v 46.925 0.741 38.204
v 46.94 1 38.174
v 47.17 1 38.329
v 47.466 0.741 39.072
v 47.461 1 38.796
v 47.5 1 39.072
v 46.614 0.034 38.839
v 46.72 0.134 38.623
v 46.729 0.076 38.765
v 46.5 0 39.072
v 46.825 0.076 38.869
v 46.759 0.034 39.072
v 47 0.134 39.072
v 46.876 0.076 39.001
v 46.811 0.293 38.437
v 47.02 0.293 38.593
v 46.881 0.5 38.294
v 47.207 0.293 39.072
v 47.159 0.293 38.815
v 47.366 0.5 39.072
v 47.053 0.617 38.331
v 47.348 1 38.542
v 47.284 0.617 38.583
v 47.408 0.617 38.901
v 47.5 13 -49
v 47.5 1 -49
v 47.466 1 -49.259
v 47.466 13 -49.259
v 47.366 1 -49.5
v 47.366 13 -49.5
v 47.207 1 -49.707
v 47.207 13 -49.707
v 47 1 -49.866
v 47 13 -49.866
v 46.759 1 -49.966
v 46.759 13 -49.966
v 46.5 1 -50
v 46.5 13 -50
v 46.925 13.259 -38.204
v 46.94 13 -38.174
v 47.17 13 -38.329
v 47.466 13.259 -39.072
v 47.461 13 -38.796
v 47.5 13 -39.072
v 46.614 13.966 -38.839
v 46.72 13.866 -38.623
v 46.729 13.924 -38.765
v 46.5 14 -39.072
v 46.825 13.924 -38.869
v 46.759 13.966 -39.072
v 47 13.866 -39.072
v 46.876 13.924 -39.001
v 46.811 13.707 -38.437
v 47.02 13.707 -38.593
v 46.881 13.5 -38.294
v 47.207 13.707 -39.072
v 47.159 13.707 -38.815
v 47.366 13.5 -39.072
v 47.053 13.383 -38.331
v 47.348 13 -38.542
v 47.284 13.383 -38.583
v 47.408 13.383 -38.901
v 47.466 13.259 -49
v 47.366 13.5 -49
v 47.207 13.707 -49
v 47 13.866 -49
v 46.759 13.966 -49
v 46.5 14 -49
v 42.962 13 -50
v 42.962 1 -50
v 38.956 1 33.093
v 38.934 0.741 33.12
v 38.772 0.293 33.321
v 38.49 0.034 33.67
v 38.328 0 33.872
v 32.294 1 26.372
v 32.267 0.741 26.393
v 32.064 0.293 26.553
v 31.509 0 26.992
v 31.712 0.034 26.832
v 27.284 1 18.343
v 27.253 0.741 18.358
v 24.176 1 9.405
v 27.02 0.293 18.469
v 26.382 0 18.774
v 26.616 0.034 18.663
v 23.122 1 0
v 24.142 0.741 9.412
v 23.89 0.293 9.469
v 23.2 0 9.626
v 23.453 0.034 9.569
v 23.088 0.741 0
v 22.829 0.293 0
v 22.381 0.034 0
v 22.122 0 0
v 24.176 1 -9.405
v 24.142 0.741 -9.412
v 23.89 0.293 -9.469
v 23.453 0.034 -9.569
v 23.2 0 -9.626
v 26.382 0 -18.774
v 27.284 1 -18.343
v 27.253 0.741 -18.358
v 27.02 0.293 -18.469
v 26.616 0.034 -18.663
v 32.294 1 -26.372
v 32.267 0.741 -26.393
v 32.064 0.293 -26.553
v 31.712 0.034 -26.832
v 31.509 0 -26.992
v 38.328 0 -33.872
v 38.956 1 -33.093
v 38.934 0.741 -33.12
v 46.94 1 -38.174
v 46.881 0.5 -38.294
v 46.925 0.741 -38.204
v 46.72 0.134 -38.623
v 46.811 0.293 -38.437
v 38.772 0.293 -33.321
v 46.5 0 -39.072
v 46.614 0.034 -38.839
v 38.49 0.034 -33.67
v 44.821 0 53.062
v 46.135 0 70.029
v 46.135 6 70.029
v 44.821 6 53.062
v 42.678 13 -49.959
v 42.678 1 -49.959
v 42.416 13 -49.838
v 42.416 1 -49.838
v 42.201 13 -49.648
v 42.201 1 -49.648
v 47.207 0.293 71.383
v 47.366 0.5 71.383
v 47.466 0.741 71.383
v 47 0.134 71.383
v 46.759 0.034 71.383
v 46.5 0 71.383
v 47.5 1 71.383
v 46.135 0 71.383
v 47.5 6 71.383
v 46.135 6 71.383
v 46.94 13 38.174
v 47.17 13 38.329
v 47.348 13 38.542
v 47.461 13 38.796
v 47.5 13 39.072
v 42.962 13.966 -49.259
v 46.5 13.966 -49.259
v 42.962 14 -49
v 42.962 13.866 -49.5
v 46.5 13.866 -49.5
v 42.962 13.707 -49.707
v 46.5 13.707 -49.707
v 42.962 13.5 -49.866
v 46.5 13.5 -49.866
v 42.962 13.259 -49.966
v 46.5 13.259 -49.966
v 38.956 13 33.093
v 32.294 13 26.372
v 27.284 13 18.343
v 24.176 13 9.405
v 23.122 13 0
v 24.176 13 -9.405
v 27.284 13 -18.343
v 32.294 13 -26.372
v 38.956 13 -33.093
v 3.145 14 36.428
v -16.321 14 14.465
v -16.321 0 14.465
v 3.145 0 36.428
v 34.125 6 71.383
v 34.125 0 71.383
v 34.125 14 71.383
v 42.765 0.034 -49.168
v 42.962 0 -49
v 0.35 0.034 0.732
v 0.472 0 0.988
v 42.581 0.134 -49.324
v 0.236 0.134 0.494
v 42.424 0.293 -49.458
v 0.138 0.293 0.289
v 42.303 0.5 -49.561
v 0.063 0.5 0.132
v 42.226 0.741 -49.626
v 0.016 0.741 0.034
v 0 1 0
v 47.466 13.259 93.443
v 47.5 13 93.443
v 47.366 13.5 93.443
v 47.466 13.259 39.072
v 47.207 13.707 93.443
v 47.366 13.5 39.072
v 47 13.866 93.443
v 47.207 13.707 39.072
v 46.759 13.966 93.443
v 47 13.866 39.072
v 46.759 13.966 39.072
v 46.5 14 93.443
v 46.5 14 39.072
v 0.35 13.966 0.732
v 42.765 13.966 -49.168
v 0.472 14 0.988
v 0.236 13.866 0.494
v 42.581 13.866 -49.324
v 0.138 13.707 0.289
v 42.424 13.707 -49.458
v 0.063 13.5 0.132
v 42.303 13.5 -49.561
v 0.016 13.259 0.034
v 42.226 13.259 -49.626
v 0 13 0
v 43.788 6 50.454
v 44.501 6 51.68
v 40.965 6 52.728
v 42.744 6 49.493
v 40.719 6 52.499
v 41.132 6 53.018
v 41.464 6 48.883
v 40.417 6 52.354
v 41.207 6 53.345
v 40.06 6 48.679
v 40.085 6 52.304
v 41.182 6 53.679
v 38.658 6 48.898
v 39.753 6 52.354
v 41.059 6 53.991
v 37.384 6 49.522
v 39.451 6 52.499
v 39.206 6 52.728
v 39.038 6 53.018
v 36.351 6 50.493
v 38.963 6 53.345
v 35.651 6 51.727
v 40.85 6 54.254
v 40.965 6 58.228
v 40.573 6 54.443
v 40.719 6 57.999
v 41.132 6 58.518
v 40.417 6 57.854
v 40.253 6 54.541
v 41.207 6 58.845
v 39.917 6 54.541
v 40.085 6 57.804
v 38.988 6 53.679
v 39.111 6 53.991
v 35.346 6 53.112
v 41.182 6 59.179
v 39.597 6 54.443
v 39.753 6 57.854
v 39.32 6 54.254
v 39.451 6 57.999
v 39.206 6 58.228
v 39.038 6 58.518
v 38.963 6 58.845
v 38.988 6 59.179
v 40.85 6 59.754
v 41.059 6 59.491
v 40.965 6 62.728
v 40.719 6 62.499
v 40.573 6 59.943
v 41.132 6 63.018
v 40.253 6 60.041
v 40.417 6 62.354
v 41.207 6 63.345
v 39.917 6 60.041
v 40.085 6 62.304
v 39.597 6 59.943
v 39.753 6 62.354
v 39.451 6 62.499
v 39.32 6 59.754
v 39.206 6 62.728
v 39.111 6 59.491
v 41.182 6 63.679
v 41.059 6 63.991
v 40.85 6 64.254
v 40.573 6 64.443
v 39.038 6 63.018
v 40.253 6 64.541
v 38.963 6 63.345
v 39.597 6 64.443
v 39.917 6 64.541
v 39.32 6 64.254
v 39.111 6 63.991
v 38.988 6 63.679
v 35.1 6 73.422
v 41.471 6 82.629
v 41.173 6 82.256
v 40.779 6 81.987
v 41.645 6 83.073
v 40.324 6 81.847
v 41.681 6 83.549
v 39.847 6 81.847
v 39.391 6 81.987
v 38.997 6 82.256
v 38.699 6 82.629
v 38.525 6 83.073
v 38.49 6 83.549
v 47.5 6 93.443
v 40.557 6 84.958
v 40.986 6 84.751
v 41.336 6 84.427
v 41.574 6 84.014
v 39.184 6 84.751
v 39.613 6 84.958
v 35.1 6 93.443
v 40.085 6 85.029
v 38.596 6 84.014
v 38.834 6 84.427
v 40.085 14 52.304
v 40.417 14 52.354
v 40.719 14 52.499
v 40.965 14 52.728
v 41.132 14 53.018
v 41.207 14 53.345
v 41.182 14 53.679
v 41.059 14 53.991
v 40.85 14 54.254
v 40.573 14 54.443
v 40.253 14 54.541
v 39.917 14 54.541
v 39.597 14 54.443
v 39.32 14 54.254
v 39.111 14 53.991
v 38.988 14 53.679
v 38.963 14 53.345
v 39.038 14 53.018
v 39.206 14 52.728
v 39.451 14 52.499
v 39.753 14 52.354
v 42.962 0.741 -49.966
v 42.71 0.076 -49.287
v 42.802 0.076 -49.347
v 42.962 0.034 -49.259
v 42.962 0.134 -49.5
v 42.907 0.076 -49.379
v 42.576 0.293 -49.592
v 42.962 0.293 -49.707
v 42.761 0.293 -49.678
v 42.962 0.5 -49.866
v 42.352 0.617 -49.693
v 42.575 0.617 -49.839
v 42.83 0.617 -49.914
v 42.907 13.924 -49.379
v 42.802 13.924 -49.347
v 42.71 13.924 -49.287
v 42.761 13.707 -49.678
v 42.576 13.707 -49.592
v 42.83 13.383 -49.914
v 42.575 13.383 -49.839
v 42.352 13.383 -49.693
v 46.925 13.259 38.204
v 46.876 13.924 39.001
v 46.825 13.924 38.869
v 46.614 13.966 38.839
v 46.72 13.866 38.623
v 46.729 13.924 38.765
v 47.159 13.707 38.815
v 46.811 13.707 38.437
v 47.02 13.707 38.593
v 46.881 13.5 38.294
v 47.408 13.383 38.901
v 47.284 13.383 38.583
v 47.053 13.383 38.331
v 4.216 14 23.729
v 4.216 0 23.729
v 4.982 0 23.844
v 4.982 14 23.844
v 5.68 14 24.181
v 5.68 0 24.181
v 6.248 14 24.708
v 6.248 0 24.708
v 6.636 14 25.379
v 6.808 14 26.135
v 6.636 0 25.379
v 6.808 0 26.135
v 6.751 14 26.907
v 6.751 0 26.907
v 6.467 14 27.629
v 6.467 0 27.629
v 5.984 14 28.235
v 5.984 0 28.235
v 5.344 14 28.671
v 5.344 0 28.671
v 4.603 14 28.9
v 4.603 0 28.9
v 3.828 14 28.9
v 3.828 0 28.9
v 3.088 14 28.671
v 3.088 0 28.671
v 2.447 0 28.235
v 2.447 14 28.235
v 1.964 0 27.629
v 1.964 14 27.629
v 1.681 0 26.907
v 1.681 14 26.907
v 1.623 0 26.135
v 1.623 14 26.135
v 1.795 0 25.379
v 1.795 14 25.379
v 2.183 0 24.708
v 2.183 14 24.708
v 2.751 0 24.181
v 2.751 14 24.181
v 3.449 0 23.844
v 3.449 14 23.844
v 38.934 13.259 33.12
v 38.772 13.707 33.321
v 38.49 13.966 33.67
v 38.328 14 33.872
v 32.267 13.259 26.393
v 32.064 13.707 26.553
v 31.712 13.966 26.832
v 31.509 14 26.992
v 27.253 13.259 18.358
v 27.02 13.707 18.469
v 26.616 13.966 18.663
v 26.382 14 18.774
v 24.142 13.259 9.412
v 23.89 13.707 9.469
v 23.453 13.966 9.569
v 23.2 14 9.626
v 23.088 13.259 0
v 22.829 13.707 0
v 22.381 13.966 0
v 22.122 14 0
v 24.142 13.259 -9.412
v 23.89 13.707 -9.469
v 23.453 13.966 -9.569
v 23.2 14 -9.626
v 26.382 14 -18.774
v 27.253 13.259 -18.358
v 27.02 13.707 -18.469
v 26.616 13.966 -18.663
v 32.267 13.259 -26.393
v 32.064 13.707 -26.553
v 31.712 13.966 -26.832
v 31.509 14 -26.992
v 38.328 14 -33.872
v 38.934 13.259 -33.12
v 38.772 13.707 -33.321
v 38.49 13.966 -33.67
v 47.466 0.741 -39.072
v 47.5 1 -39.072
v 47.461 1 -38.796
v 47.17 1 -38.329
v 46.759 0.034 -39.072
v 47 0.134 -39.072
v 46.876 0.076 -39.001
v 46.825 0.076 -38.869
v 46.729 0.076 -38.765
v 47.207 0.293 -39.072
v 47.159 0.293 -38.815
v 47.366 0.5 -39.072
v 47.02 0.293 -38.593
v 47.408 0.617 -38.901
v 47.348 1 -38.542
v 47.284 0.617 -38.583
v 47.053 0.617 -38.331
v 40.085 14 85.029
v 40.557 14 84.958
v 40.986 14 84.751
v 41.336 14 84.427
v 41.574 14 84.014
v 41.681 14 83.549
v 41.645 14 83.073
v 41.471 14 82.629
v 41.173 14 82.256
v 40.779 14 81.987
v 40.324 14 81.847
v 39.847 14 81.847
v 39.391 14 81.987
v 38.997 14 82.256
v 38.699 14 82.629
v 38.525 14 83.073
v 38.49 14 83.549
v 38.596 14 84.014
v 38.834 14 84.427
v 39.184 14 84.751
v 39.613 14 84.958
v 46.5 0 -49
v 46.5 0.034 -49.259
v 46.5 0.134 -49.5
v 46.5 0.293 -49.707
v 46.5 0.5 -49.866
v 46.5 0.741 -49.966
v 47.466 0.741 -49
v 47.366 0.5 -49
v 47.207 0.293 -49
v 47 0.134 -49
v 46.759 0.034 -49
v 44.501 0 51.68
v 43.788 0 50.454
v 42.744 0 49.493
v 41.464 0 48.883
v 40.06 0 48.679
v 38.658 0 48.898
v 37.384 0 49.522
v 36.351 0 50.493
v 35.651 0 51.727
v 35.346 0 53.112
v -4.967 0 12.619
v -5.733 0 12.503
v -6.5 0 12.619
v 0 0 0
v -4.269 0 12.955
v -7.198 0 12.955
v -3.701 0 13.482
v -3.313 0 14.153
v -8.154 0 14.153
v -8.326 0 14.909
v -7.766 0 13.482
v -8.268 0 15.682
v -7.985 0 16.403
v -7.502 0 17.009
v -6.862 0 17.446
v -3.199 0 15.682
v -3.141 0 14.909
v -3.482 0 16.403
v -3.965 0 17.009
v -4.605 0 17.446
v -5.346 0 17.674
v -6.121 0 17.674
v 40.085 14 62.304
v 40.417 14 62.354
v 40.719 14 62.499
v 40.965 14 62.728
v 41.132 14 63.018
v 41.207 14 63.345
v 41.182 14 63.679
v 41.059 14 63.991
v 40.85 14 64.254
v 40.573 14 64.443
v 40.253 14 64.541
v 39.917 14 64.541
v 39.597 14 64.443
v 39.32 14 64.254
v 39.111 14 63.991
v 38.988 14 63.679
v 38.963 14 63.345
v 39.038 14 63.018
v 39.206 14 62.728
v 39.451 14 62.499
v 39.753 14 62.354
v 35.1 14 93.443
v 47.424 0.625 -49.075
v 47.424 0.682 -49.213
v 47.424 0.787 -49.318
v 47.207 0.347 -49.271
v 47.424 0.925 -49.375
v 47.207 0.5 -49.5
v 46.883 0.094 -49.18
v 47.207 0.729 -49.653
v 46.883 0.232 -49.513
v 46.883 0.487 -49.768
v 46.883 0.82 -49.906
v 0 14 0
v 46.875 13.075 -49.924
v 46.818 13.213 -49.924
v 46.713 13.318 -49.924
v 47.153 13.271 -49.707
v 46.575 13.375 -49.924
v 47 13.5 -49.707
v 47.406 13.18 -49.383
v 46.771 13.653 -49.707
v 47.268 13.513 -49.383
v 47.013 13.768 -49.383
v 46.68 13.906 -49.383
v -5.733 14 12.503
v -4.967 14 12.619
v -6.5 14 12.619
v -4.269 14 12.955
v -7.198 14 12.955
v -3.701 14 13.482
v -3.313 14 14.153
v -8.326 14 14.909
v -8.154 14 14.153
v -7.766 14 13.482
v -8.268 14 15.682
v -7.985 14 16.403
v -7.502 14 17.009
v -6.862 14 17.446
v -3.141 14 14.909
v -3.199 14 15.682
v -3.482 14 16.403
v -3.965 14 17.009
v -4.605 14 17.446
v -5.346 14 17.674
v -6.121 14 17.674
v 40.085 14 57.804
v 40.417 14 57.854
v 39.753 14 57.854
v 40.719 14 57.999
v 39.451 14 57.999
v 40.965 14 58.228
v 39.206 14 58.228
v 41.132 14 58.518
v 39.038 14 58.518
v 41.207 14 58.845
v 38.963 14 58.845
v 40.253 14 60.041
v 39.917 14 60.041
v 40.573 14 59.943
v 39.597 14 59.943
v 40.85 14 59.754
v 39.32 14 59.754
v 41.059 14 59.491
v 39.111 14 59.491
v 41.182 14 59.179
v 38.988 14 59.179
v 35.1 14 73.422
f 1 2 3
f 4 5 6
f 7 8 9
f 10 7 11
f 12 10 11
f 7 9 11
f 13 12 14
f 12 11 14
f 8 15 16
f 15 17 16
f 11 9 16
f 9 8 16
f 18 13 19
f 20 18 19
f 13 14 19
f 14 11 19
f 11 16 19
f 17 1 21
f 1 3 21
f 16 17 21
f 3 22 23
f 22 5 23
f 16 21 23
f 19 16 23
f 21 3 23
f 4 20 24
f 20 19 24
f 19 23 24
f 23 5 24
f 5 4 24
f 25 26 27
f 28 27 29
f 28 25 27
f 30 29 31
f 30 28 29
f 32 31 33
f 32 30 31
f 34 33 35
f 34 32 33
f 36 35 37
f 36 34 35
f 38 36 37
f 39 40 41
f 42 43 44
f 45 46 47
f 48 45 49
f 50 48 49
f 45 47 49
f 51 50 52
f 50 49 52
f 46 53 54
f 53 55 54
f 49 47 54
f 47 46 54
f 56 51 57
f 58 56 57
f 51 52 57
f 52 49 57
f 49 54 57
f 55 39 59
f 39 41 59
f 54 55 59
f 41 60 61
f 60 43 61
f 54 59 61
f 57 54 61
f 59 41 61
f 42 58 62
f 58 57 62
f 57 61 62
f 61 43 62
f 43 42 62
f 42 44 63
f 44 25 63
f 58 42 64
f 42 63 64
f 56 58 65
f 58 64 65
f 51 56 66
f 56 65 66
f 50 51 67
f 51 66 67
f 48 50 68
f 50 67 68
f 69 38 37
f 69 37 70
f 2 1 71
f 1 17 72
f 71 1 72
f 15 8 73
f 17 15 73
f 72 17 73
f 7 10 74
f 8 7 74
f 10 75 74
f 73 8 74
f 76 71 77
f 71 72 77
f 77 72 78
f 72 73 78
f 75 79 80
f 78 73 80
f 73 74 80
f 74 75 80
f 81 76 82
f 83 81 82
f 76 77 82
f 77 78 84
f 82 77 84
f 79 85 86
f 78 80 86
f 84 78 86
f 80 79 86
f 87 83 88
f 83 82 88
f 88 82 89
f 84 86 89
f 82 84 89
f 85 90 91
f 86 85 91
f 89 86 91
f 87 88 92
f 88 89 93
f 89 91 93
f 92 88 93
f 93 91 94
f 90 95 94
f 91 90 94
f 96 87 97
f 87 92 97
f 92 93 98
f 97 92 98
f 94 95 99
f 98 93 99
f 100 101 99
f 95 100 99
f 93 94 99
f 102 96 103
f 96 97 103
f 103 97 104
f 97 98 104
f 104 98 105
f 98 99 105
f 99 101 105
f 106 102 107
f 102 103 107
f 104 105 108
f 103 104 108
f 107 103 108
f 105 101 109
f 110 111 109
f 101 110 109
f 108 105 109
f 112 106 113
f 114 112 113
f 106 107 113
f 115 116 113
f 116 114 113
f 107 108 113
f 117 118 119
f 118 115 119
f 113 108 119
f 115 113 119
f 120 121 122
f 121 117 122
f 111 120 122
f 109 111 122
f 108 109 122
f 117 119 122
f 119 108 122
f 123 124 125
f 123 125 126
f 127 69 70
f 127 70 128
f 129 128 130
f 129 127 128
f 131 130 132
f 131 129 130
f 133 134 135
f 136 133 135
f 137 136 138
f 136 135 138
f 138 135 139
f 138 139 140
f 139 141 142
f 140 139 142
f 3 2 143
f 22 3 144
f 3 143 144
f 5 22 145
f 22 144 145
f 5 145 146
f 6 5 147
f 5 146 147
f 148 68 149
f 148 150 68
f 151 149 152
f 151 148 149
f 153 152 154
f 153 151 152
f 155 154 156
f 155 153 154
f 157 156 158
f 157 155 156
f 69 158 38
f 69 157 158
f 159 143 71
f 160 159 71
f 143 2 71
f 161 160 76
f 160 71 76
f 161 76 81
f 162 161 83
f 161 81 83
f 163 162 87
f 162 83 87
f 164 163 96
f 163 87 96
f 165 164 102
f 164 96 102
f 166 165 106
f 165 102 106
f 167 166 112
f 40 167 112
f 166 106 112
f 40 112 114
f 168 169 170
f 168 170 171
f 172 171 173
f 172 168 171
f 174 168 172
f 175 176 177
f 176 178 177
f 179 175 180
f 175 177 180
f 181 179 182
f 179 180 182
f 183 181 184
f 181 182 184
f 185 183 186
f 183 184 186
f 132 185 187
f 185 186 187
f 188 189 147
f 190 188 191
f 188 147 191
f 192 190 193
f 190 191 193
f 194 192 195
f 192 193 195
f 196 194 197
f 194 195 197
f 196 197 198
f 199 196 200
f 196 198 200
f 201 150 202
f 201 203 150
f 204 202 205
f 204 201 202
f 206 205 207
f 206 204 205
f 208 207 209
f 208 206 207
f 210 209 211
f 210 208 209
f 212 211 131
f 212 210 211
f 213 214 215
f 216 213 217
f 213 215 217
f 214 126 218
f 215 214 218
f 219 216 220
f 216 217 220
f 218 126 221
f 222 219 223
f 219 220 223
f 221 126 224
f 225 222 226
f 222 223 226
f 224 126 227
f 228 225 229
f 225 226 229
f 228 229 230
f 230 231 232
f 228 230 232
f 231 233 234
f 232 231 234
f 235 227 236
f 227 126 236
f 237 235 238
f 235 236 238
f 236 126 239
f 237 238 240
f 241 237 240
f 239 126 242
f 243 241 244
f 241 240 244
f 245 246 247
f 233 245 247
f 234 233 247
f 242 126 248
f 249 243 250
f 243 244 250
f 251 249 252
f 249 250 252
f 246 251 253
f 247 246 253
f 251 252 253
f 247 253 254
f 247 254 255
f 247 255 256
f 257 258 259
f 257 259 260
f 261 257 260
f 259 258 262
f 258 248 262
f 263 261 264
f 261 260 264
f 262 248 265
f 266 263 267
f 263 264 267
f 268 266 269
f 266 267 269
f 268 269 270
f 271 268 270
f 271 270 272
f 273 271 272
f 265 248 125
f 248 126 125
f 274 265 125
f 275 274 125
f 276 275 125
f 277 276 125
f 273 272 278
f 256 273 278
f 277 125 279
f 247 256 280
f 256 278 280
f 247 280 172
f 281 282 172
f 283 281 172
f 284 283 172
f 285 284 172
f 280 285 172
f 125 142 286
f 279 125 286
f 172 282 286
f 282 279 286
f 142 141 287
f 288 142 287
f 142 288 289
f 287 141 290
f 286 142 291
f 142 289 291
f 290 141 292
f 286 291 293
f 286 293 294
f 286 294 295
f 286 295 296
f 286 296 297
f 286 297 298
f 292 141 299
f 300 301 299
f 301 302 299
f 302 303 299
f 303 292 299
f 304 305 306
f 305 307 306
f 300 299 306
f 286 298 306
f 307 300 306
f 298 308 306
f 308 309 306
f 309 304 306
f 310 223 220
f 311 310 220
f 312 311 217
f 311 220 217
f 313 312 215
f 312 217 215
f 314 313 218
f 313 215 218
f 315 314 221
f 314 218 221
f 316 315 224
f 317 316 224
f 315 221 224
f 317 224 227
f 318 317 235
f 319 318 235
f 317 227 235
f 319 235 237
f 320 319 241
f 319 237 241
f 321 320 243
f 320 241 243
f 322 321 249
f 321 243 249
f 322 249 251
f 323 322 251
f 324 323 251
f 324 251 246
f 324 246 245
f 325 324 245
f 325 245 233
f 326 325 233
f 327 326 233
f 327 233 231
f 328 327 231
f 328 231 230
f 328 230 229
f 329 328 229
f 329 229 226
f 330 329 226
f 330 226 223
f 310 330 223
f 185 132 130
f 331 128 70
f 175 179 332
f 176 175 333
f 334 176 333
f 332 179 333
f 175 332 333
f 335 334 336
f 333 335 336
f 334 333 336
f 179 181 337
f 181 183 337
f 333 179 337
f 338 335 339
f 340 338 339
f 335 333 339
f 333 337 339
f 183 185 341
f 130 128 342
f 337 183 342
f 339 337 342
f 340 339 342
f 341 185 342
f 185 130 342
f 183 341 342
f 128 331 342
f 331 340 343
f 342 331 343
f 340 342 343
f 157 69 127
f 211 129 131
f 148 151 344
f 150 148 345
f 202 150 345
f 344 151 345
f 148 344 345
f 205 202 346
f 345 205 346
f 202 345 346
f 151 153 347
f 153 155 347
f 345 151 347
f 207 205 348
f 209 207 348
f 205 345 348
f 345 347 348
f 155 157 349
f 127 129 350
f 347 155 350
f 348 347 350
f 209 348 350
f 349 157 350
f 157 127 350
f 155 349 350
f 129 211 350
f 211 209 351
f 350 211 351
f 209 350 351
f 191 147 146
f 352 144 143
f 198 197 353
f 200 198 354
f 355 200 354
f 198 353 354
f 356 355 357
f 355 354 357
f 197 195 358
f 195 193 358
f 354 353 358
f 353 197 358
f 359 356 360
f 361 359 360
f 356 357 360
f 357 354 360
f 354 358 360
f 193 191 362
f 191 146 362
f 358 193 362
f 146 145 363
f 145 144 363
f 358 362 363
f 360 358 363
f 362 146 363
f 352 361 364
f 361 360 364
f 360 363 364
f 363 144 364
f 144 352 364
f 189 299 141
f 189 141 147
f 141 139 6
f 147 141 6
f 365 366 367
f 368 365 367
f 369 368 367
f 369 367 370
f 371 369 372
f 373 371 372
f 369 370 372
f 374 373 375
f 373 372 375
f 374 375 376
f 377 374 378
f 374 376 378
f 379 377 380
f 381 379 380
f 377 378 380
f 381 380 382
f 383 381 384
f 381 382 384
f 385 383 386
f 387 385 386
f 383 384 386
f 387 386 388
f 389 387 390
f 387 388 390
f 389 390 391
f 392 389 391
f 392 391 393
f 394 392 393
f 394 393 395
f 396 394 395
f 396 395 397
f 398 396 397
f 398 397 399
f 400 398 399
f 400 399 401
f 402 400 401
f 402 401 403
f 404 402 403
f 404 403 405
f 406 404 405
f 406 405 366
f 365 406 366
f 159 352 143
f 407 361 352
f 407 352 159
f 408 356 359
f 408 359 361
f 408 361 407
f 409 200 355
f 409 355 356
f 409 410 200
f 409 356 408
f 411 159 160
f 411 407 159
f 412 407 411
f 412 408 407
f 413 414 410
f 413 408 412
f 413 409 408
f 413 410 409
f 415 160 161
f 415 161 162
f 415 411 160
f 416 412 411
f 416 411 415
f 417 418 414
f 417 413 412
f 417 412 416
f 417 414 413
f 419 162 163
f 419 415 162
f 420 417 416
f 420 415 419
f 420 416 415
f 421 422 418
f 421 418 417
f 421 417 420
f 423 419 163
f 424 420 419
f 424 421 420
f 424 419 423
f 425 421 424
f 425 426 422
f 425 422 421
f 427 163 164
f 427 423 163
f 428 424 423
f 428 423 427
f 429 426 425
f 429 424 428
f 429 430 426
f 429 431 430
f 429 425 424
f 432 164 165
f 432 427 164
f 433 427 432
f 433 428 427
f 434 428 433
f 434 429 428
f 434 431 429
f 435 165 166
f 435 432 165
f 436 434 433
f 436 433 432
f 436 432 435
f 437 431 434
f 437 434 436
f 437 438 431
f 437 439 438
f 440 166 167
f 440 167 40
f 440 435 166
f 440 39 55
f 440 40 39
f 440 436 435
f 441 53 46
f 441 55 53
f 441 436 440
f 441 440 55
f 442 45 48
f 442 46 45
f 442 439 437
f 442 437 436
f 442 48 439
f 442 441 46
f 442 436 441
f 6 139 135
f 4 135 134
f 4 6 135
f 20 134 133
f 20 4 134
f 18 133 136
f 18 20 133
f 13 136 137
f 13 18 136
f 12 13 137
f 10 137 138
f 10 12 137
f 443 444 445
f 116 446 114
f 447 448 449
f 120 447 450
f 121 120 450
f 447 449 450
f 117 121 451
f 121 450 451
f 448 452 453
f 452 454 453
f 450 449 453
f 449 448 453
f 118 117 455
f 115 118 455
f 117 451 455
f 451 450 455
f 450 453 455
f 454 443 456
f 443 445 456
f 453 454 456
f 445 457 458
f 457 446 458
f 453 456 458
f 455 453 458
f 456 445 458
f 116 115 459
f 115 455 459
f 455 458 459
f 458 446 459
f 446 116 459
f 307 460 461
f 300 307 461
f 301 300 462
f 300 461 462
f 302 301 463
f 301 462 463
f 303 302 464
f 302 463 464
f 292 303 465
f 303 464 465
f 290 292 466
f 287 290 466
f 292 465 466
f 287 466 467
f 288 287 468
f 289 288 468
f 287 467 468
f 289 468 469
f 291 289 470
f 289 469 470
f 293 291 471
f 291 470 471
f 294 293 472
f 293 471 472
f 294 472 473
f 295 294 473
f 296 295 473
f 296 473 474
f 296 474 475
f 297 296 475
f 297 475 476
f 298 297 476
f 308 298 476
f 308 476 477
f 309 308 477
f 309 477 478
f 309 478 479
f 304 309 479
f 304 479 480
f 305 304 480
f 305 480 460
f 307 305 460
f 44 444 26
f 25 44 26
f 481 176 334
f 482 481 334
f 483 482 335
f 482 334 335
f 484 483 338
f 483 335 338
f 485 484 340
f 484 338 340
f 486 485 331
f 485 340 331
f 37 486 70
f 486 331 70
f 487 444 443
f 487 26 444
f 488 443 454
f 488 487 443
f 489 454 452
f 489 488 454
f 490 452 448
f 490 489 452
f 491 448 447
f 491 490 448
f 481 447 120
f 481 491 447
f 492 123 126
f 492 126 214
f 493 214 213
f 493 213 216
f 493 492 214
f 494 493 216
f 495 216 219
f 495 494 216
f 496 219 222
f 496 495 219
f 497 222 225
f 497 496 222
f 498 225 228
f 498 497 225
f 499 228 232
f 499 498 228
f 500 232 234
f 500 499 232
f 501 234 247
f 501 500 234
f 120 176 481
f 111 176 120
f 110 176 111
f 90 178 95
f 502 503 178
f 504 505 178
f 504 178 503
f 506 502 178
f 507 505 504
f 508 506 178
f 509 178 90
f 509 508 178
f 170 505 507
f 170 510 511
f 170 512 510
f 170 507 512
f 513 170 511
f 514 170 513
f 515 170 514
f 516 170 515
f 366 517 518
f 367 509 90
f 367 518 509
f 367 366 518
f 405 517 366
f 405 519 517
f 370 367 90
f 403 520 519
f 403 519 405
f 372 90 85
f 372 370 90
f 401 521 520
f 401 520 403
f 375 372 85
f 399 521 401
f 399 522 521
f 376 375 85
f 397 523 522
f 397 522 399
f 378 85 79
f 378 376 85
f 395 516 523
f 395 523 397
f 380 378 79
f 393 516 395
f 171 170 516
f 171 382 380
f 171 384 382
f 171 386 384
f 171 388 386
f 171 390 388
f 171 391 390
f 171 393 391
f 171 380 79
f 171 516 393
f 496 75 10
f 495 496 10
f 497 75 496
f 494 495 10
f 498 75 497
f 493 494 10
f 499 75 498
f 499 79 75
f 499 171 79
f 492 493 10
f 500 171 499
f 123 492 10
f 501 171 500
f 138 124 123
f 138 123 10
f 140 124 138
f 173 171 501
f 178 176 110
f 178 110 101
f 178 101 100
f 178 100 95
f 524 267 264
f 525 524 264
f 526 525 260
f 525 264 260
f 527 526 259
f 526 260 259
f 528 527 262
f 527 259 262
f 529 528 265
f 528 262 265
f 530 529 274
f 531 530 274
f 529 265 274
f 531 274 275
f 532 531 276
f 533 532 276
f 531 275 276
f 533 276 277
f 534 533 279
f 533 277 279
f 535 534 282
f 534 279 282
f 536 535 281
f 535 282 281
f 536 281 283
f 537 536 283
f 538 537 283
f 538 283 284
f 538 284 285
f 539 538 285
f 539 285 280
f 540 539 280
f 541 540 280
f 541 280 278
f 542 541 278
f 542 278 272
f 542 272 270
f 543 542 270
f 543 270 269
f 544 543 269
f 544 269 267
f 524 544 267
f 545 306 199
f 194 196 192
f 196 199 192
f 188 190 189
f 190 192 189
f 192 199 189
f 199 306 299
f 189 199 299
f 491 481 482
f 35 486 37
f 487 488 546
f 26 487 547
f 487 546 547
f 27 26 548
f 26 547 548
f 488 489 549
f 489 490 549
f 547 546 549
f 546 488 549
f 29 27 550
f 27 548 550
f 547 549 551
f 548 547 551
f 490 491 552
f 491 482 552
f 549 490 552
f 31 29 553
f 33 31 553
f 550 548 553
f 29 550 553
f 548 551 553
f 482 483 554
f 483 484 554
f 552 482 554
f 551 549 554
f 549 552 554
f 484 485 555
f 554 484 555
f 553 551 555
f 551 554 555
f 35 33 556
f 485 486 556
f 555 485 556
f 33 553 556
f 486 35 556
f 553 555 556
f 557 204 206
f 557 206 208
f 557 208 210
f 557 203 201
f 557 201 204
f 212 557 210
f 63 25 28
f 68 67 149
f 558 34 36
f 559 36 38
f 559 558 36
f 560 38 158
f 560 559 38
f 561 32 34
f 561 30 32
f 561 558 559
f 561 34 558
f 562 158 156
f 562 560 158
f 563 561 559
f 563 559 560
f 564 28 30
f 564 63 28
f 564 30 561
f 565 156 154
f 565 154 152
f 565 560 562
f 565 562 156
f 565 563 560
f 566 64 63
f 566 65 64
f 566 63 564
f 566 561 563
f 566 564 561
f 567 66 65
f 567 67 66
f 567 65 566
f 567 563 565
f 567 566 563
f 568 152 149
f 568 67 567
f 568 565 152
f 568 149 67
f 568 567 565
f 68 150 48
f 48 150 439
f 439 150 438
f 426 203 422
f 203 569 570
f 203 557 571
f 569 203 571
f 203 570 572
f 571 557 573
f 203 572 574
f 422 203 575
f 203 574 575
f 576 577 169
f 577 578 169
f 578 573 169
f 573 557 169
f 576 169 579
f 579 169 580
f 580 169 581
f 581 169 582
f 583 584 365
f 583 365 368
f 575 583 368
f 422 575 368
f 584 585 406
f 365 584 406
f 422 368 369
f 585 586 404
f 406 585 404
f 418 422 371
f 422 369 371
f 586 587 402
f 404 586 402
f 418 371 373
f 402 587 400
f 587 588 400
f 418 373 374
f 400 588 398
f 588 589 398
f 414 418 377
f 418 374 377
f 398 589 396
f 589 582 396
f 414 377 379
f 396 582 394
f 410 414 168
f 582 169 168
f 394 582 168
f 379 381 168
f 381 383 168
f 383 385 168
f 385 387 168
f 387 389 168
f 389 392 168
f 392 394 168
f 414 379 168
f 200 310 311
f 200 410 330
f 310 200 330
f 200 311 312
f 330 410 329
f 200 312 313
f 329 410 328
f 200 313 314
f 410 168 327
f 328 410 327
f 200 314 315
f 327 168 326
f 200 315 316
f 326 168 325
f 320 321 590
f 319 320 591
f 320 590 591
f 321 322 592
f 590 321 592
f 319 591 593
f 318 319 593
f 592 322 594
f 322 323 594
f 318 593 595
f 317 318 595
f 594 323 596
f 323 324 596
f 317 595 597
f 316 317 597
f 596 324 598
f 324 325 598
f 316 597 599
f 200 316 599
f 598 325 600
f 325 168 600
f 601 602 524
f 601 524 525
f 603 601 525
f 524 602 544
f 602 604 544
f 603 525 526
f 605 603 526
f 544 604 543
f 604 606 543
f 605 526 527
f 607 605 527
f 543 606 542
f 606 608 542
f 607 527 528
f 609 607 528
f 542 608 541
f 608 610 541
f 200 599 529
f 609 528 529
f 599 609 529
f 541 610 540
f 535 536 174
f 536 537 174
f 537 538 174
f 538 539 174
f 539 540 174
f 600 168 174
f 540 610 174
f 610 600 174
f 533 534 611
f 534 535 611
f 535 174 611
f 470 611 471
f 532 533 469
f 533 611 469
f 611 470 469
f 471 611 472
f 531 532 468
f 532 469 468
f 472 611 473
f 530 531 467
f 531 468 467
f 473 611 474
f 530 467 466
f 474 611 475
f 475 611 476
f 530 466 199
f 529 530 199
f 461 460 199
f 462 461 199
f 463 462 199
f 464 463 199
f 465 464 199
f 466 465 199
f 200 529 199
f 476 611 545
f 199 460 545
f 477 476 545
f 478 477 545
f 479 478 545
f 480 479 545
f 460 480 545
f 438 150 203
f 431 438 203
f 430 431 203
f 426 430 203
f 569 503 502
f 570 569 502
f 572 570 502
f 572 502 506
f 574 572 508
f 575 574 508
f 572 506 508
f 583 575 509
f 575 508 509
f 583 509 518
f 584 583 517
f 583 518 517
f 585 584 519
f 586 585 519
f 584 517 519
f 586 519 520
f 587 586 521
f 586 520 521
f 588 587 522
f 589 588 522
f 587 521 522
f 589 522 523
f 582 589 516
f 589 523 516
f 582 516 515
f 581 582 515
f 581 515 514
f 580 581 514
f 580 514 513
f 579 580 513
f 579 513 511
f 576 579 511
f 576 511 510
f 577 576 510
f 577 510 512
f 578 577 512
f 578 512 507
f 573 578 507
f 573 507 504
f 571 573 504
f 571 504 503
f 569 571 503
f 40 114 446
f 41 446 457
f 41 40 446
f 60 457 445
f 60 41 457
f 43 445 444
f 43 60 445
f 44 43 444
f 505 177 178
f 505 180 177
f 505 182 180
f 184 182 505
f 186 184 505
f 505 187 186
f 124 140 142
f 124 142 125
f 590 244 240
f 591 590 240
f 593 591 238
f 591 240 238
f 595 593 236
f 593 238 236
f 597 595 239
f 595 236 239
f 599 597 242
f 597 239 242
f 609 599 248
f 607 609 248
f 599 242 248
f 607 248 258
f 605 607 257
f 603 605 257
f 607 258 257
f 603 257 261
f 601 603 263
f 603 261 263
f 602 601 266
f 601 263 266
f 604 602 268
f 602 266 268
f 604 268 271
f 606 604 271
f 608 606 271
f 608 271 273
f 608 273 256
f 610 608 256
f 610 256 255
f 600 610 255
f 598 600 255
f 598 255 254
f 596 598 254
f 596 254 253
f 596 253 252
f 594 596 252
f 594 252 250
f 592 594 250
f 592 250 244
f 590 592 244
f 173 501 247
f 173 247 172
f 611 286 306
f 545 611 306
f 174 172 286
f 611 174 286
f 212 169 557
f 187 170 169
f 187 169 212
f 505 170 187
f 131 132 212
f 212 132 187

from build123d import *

# Parameters (mm, degrees)
BOSS_EXTRUDE1_DEPTH      = 14
SKETCH3_R                = 4.125
CUT_EXTRUDE1_DEPTH       = 6
SKETCH5_R                = 1.125
CUT_EXTRUDE2_DEPTH       = 15
FILLET1_R                = 1
BOSS_EXTRUDE3_DEPTH      = 20
BOSS_EXTRUDE3_DEPTH_BACK = 34
SKETCH7_W                = 46.707438453
SKETCH7_H                = 20
CUT_EXTRUDE3_DEPTH       = 30
BOSS_EXTRUDE4_DEPTH      = 3
BOSS_EXTRUDE5_START      = -54
BOSS_EXTRUDE5_DEPTH      = 3
CUT_EXTRUDE5_REACH       = 111.564
SKETCH15_W               = 26.880557743
SKETCH15_H               = 40.856784115
CUT_EXTRUDE6_REACH       = 113.249
SKETCH16_R               = 1.6
CUT_EXTRUDE7_DEPTH       = 112.248863996
CUT_EXTRUDE8_DEPTH       = 106.753443393
SKETCH20_R               = 2.6
CUT_EXTRUDE9_DEPTH       = 106.753443393


with BuildPart() as part:
    # Sketch1 → Boss-Extrude1 (new body)
    with BuildSketch(Plane(origin=(0, 0, 0), x_dir=(1, 0, 0), z_dir=(0, 1, 0))):
        with BuildLine():
            Line((47.5, -78.442713945), (47.5, -38.442713945))
            ThreePointArc((47.5, -38.442713945), (23.122023742, 0), (47.5, 38.442713945))
            Line((47.5, 38.442713945), (47.5, 50))
            Line((47.5, 50), (42.5, 50))
            Line((42.5, 50), (0, 0))
            Line((0, 0), (35.1, -73.422380253))
            Line((35.1, -73.422380253), (35.1, -93.442713945))
            Line((35.1, -93.442713945), (37.5, -93.442713945))
            Line((37.5, -93.442713945), (47.5, -93.442713945))
            Line((47.5, -93.442713945), (47.5, -78.442713945))
        make_face()
    extrude(amount=BOSS_EXTRUDE1_DEPTH)

    # Sketch3 → Cut-Extrude1 (cut)
    with BuildSketch(Plane.XZ):
        with BuildLine():
            Line((33.254958794, 84.403112572), (36.18509612, 92.428977457))
            Line((36.18509612, 92.428977457), (44.88509612, 92.428977457))
            Line((44.88509612, 92.428977457), (46.13509612, 88.028977457))
            Line((46.13509612, 88.028977457), (46.13509612, 70.028977457))
            Line((46.13509612, 70.028977457), (44.820911197, 53.062159312))
            ThreePointArc((44.820911197, 53.062159312), (40.059955227, 48.679043991), (35.34566343, 53.112310791))
            Line((35.34566343, 53.112310791), (33.254958794, 84.403112572))
        make_face()
        with Locations(Location((40.08509612, 83.428977457, 0), (0, 0, 90))):
            Circle(SKETCH3_R, mode=Mode.SUBTRACT)
    extrude(amount=-CUT_EXTRUDE1_DEPTH, mode=Mode.SUBTRACT)

    # Sketch5 → Cut-Extrude2 (cut)
    with BuildSketch(Plane.XZ.offset(-6)):
        with Locations(Location((40.08509612, 63.428977457, 0), (0, 0, 270))):
            Circle(SKETCH5_R)
        with Locations(Location((40.08509612, 58.928977457, 0), (0, 0, 270))):
            Circle(SKETCH5_R)
        with Locations(Location((40.08509612, 53.428977457, 0), (0, 0, 270))):
            Circle(SKETCH5_R)
    extrude(amount=-CUT_EXTRUDE2_DEPTH, mode=Mode.SUBTRACT)

    # Fillet1
    fillet1_edges = [part.edges().sort_by_distance(p)[0] for p in [
        (21.25, 0, -25),
        (45, 0, -50),
        (47.5, 0, -44.221356973),
        (23.122023742, 14, 0),
        (23.122023742, 0, 0),
        (47.5, 0, 65.942713945),
        (47.5, 14, -44.221356973),
        (42.5, 7, -50),
        (47.5, 7, -50),
        (47.5, 7, -38.442713945),
        (47.5, 7, 38.442713945),
        (45, 14, -50),
        (21.25, 14, -25),
        (47.5, 14, 65.942713945),
    ]]
    fillet(fillet1_edges, radius=FILLET1_R)

    # Sketch6 → Boss-Extrude3 (add, two sides: drawn at the far end of the back side and taken through both)
    with BuildSketch(Plane.XZ.offset(-BOSS_EXTRUDE3_DEPTH_BACK)):
        with BuildLine():
            Line((-40.458581161, -20.077158004), (-49.887563088, -23.407968691))
            Line((-49.887563088, -23.407968691), (34.124921356, 71.382705183))
            Line((34.124921356, 71.382705183), (0, 0))
            ThreePointArc((0, 0), (-10.212270894, 1.77453397), (-20.560220827, 2.374016932))
            Line((-20.560220827, 2.374016932), (-40.458581161, -20.077158004))
        make_face()
    extrude(amount=BOSS_EXTRUDE3_DEPTH + BOSS_EXTRUDE3_DEPTH_BACK)

    # Sketch7 → Cut-Extrude3 (cut)
    with BuildSketch(Plane(origin=(-16.32086192, 0, 14.465095586), x_dir=(0.6632786778078259, 0, 0.7483724978682089), z_dir=(-0.7483724978682089, 0, 0.6632786778078259))):
        with Locations((52.701466874, 24)):
            Rectangle(SKETCH7_W, SKETCH7_H)
        with Locations((52.701466874, -10)):
            Rectangle(SKETCH7_W, SKETCH7_H)
    extrude(amount=-CUT_EXTRUDE3_DEPTH, mode=Mode.SUBTRACT)

    # Sketch10 → Boss-Extrude4 (add)
    with BuildSketch(Plane.XZ.offset(20)):
        Polygon((-49.887563088, -23.407968691), (-42.403838109, -30.040755469), (0, 0), (-16.723629197, 14.010656202), align=None)
    extrude(amount=-BOSS_EXTRUDE4_DEPTH)

    # Sketch10<2> → Boss-Extrude5 (add)
    with BuildSketch(Plane.XZ.offset(20).offset(BOSS_EXTRUDE5_START)):
        Polygon((-49.887563088, -23.407968691), (-42.403838109, -30.040755469), (0, 0), (-16.723629197, 14.010656202), align=None)
    extrude(amount=BOSS_EXTRUDE5_DEPTH)

    # Cut-Extrude5: up to this face of the body (flat: up to its plane)
    cut_extrude5_end = Plane(part.part.faces().sort_by_distance((40.08509612, 0, 83.428977457))[0])
    # Sketch15 → Cut-Extrude5 (cut, up to the picked face)
    with BuildSketch(Plane(origin=(0, 6, 0), x_dir=(-1, 0, 0), z_dir=(0, -1, 0)), mode=Mode.PRIVATE) as cut_extrude5_sk1:
        with Locations((-44.420319758, -91.811097241)):
            Rectangle(SKETCH15_W, SKETCH15_H)
    cut_extrude5_tool1 = split(extrude(cut_extrude5_sk1.sketch, amount=CUT_EXTRUDE5_REACH, mode=Mode.PRIVATE), bisect_by=cut_extrude5_end, keep=Keep.BOTH, mode=Mode.PRIVATE)
    add(cut_extrude5_tool1.solids().sort_by(Axis((44.42032, 6, 91.811097), (0, -1, 0)))[0], mode=Mode.SUBTRACT)

    # Sketch16 → Cut-Extrude6 (cut, up to next)
    with BuildSketch(Plane(origin=(0, 14, 0), x_dir=(1, 0, 0), z_dir=(0, 1, 0)), mode=Mode.PRIVATE) as cut_extrude6_sk1:
        with Locations(Location((40.08509612, -83.428977457, 0), (0, 0, 270))):
            Circle(SKETCH16_R)
    cut_extrude6_tool1 = extrude(cut_extrude6_sk1.sketch, amount=-CUT_EXTRUDE6_REACH, mode=Mode.PRIVATE) & part.part
    add(cut_extrude6_tool1.solids().sort_by_distance((40.085096, 14, 83.428977))[0], mode=Mode.SUBTRACT)

    # Sketch18 → Cut-Extrude7 (cut, through all)
    with BuildSketch(Plane(origin=(0, 0, 0), x_dir=(-0.4313049702307203, 0, -0.902206197415135), z_dir=(0.902206197415135, 0, -0.4313049702307203))):
        Polygon((-39.631978176, 14), (0, 14), (0, 0), (-37.370332893, 0), (-34.306310934, -43.962437664), (76.533165387, -56.066116366), (76.533165387, 47.196171587), (-42.014855984, 38.664050635), align=None)
    extrude(amount=-CUT_EXTRUDE7_DEPTH, mode=Mode.SUBTRACT)

    # Sketch19 → Cut-Extrude8 (cut, through all)
    with BuildSketch(Plane(origin=(0, 0, 0), x_dir=(-1, 0, 0), z_dir=(0, -1, 0))):
        Polygon((16.32086192, -14.465095586), (0, 0), (18.115156321, 31.62995048), (35.203757787, 6.840338193), align=None)
    extrude(amount=-CUT_EXTRUDE8_DEPTH, mode=Mode.SUBTRACT)

    # Sketch20 → Cut-Extrude9 (cut, through all)
    with BuildSketch(Plane(origin=(0, 0, 0), x_dir=(-1, 0, 0), z_dir=(0, -1, 0))):
        with Locations(Location((5.733478103, -15.103299236, 0), (0, 0, 90))):
            Circle(SKETCH20_R)
        with Locations(Location((-4.215702064, -26.328886704, 0), (0, 0, 90))):
            Circle(SKETCH20_R)
    extrude(amount=-CUT_EXTRUDE9_DEPTH, mode=Mode.SUBTRACT)


solid = part.part
